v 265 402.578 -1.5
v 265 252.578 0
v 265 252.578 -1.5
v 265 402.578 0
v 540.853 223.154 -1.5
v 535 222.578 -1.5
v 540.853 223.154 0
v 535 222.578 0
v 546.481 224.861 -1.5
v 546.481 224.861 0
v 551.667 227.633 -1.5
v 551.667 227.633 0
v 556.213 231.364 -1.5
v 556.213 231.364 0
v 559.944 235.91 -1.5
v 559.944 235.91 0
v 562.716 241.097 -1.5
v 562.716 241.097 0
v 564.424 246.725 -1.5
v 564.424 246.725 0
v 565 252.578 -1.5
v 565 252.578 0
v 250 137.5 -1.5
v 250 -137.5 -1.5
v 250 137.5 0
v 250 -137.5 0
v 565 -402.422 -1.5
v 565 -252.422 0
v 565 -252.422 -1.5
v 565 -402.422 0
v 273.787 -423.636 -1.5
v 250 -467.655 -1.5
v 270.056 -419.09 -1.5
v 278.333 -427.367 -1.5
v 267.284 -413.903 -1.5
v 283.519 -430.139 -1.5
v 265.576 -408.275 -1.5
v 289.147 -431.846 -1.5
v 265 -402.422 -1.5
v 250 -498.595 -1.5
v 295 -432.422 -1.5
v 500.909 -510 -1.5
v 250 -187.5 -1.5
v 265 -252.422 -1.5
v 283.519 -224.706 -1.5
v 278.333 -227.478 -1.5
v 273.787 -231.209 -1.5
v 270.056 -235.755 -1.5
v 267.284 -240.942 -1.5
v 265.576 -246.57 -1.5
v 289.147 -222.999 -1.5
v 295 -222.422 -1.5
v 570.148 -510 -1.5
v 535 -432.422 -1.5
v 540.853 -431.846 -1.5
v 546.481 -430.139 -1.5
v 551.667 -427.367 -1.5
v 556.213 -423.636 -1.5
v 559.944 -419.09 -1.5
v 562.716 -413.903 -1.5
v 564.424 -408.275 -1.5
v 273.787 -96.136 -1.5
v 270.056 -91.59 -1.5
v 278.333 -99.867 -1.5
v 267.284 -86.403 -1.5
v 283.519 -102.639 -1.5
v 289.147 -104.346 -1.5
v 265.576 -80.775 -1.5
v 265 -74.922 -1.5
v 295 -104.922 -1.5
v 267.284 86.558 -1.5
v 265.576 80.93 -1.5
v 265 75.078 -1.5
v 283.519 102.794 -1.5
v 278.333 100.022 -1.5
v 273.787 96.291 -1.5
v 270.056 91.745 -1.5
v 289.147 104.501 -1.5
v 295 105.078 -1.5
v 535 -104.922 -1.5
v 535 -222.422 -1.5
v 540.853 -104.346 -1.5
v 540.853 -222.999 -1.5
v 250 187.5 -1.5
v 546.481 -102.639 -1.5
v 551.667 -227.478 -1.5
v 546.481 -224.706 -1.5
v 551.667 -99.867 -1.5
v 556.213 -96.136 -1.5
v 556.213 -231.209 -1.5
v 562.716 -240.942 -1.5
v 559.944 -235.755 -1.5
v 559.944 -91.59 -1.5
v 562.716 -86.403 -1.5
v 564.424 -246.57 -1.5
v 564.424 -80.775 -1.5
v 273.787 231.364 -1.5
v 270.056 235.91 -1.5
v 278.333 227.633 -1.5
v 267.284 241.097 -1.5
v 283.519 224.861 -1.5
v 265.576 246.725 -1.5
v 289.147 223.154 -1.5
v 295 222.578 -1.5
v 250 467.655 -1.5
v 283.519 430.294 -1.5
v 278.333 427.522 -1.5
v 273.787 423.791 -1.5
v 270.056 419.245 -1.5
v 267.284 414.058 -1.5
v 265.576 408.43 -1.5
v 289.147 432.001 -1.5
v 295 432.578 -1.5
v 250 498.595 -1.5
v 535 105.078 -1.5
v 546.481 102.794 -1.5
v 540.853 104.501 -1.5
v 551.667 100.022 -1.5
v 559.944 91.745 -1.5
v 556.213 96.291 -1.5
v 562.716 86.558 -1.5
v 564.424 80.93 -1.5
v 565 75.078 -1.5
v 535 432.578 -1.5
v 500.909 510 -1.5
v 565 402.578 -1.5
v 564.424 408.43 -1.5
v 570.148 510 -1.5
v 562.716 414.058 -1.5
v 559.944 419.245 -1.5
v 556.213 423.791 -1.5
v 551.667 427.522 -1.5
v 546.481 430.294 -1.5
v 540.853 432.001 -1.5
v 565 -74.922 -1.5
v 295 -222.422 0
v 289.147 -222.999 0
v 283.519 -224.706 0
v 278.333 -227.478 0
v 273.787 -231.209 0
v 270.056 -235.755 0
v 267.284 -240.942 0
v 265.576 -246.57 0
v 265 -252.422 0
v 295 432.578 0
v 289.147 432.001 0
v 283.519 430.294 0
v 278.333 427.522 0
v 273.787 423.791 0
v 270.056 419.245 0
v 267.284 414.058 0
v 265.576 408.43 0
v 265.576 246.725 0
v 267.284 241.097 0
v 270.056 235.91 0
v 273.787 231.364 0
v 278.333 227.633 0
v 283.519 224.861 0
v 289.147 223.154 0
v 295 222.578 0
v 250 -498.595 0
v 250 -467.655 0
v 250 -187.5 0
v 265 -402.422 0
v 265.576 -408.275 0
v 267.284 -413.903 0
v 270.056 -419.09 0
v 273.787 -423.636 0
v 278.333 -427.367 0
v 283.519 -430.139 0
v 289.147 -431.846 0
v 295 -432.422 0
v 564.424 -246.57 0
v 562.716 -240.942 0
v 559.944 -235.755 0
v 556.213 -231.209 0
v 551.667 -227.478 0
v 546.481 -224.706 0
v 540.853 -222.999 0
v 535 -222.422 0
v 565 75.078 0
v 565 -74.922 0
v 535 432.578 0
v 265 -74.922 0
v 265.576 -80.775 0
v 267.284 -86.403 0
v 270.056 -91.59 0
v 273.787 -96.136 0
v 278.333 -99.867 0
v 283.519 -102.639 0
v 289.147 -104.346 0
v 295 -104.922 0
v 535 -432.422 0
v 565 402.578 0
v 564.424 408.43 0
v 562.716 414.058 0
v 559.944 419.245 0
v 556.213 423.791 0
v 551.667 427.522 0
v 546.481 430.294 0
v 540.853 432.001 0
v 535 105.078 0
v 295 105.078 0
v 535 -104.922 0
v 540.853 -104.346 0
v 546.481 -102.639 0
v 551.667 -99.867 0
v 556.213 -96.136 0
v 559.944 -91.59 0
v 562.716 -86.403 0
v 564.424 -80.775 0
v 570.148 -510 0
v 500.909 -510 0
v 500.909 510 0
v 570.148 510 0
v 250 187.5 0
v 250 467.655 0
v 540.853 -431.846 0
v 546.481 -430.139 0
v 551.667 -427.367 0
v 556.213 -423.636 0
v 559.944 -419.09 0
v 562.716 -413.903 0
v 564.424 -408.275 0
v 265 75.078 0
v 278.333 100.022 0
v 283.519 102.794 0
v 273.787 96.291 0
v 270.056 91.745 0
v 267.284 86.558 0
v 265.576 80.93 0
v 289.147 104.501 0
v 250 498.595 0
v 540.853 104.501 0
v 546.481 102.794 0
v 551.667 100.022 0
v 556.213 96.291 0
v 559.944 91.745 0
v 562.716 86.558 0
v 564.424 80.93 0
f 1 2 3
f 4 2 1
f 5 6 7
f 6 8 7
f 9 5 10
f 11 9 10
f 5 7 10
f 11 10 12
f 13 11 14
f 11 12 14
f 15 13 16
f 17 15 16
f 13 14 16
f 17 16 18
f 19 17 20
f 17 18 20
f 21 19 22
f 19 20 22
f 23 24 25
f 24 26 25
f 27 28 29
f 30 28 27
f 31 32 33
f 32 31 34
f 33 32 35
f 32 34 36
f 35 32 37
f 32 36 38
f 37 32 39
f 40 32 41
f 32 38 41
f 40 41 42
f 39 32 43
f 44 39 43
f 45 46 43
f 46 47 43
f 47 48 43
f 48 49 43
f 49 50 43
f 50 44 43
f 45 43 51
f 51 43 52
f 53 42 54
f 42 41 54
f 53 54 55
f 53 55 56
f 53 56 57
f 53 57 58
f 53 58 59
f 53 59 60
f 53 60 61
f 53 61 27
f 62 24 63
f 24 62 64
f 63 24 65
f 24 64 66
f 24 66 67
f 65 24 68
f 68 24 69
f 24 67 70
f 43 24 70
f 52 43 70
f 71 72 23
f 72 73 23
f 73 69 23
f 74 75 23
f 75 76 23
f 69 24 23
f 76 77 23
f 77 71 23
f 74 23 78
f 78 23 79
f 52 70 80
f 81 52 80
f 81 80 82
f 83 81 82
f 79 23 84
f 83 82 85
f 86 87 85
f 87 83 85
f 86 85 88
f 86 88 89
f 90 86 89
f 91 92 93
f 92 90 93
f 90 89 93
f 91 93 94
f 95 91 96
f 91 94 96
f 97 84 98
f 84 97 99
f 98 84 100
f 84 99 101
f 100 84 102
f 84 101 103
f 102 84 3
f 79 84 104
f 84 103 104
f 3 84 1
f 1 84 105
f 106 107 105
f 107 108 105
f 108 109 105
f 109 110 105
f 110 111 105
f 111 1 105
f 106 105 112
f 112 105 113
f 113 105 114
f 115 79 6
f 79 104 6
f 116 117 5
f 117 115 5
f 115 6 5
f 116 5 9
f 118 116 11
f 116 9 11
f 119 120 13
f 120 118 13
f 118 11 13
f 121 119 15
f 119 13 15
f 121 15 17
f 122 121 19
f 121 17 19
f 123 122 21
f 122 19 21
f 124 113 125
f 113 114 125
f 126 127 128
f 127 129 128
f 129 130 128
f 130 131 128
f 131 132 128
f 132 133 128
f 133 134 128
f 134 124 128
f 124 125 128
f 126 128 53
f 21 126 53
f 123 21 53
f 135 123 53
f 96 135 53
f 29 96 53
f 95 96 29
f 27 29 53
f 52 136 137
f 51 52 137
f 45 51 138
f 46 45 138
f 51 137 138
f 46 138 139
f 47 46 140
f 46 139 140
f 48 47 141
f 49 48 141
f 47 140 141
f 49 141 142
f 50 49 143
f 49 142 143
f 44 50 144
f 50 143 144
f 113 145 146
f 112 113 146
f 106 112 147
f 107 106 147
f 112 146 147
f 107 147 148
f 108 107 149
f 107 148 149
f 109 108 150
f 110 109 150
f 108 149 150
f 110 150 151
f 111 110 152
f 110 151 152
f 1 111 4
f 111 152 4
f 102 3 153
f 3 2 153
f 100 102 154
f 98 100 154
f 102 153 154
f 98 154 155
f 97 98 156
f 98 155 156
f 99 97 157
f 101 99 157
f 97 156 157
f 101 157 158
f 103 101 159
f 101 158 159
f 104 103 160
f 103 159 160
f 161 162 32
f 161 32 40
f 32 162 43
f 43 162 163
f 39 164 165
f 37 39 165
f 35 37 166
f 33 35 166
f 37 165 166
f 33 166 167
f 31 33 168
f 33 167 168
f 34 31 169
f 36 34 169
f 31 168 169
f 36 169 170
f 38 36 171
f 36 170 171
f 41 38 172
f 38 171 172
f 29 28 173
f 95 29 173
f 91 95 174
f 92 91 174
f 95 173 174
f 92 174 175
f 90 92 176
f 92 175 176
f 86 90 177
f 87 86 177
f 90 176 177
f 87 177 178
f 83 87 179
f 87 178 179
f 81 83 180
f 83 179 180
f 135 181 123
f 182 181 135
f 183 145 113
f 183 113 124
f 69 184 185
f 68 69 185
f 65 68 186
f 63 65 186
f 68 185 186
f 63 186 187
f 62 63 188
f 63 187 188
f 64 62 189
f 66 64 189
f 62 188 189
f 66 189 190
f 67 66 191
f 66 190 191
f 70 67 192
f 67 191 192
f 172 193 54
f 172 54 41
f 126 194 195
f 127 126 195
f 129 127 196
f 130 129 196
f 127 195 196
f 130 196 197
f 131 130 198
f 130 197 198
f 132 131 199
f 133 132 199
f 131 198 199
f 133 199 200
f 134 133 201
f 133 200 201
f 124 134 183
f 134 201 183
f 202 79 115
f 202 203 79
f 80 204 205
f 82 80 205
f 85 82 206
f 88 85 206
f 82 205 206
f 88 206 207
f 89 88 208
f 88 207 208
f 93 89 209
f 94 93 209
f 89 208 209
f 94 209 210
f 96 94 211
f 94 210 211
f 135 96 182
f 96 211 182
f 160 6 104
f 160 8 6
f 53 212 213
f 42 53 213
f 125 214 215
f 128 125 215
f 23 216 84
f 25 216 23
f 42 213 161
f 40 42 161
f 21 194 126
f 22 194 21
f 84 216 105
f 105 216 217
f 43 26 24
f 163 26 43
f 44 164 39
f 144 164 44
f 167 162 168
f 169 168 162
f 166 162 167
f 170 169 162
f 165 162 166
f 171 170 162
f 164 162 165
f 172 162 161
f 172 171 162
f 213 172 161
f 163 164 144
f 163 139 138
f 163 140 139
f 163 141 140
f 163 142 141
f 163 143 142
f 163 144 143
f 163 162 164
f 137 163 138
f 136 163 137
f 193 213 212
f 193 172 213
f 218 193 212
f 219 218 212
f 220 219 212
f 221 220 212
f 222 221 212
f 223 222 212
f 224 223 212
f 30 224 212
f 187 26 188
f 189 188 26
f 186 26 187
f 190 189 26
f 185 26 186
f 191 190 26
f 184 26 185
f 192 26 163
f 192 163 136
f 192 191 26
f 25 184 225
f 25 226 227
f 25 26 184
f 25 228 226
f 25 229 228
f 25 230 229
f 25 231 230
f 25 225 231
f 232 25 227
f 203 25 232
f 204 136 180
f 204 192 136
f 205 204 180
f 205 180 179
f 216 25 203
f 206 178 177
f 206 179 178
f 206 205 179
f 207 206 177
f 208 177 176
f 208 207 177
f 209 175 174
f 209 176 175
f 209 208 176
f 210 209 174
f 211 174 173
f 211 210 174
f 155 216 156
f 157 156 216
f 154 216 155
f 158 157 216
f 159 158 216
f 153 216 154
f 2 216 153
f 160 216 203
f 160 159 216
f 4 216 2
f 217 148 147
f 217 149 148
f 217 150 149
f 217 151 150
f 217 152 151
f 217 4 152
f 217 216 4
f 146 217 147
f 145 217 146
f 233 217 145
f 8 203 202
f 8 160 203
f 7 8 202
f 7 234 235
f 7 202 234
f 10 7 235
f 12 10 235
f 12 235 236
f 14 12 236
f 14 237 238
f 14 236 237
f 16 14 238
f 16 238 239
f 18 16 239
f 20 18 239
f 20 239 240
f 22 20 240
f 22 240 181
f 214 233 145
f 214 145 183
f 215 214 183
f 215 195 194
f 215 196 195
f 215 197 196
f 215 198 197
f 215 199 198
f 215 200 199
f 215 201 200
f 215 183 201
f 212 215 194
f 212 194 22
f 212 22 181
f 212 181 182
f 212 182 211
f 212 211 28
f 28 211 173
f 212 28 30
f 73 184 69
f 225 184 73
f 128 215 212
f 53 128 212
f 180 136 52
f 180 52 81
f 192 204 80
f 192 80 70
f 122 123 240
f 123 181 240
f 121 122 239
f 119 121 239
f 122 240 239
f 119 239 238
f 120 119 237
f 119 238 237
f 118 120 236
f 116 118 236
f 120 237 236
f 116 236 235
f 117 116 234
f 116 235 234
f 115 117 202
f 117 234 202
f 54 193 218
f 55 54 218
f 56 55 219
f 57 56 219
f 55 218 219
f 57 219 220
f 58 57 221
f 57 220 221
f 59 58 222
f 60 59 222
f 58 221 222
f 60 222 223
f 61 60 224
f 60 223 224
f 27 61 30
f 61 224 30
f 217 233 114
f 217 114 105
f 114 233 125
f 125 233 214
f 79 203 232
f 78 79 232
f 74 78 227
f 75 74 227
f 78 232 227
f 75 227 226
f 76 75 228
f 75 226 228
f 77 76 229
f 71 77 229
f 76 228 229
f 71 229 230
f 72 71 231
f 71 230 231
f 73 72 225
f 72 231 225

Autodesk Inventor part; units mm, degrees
ref_plane "YZ Plane" through (0, 0, 0) normal (1, 0, 0) x (0, 1, 0)
ref_plane "XZ Plane" through (0, 0, 0) normal (0, 1, 0) x (-1, 0, 0)
ref_plane "Work Plane1" through (0, 0, 0) normal (0, 0, 1) x (1, 0, 0)
sketch "Sketch1" plane through (0, 0, 0) normal (0, 0, 1) x (1, 0, 0)
  arc A0 (535, 222.5775) -> (565, 252.5775) centre (535, 252.5775) ccw
  line L0 (535, 222.5775) -> (295, 222.5775)
  arc A1 (265, 252.5775) -> (295, 222.5775) centre (295, 252.5775) ccw
  line L1 (265, 252.5775) -> (265, 402.5775)
  arc A2 (295, 432.5775) -> (265, 402.5775) centre (295, 402.5775) ccw
  line L2 (295, 432.5775) -> (535, 432.5775)
  arc A3 (565, 402.5775) -> (535, 432.5775) centre (535, 402.5775) ccw
  line L3 (565, 402.5775) -> (565, 252.5775)
  arc A4 (535, -104.9225) -> (565, -74.9225) centre (535, -74.9225) ccw
  line L4 (535, -104.9225) -> (295, -104.9225)
  arc A5 (265, -74.9225) -> (295, -104.9225) centre (295, -74.9225) ccw
  line L5 (265, -74.9225) -> (265, 75.0775)
  arc A6 (295, 105.0775) -> (265, 75.0775) centre (295, 75.0775) ccw
  line L6 (295, 105.0775) -> (535, 105.0775)
  arc A7 (565, 75.0775) -> (535, 105.0775) centre (535, 75.0775) ccw
  line L7 (565, 75.0775) -> (565, -74.9225)
  line L8 (565, -252.4225) -> (565, -402.4225)
  arc A8 (535, -432.4225) -> (565, -402.4225) centre (535, -402.4225) ccw
  line L9 (535, -432.4225) -> (295, -432.4225)
  arc A9 (265, -402.4225) -> (295, -432.4225) centre (295, -402.4225) ccw
  line L10 (265, -402.4225) -> (265, -252.4225)
  arc A10 (295, -222.4225) -> (265, -252.4225) centre (295, -252.4225) ccw
  line L11 (295, -222.4225) -> (535, -222.4225)
  arc A11 (565, -252.4225) -> (535, -222.4225) centre (535, -252.4225) ccw
  line L12 (-550, 375.7749) -> (-550, 187.5)
  arc A12 (-473.6326, 455.6923) -> (-550, 375.7749) centre (-470, 375.7749) ccw
  line L13 (229.0918, 487.6344) -> (-473.6326, 455.6923)
  arc A13 (250, 467.655) -> (229.0918, 487.6344) centre (230, 467.655) ccw
  line L14 (250, 187.5) -> (250, 467.655)
  arc A14 (230, 167.5) -> (250, 187.5) centre (230, 187.5) ccw
  line L15 (-530, 167.5) -> (230, 167.5)
  arc A15 (-550, 187.5) -> (-530, 167.5) centre (-530, 187.5) ccw
  arc A16 (250, -187.5) -> (230, -167.5) centre (230, -187.5) ccw
  line L16 (250, -467.655) -> (250, -187.5)
  arc A17 (229.0918, -487.6344) -> (250, -467.655) centre (230, -467.655) ccw
  line L17 (-473.6326, -455.6923) -> (229.0918, -487.6344)
  arc A18 (-550, -375.7749) -> (-473.6326, -455.6923) centre (-470, -375.7749) ccw
  line L18 (-550, -187.5) -> (-550, -375.7749)
  arc A19 (-530, -167.5) -> (-550, -187.5) centre (-530, -187.5) ccw
  line L19 (230, -167.5) -> (-530, -167.5)
  line L20 (-550, 137.5) -> (-550, -137.5)
  arc A20 (-530, 157.5) -> (-550, 137.5) centre (-530, 137.5) ccw
  line L21 (230, 157.5) -> (-530, 157.5)
  arc A21 (250, 137.5) -> (230, 157.5) centre (230, 137.5) ccw
  line L22 (250, -137.5) -> (250, 137.5)
  arc A22 (230, -157.5) -> (250, -137.5) centre (230, -137.5) ccw
  line L23 (-530, -157.5) -> (230, -157.5)
  arc A23 (-550, -137.5) -> (-530, -157.5) centre (-530, -137.5) ccw
  line L24 (570.1484, 510) -> (570.1484, -510)
  line L25 (500.9086, 510) -> (570.1484, 510)
  line L26 (-474.4993, 465.6633) -> (500.9086, 510)
  arc A24 (-474.4993, 465.6633) -> (-559.5063, 385.1982) centre (-470, 375.7749) ccw
  line L27 (-570.7648, 375.1108) -> (-559.5063, 385.1982)
  line L28 (-600, 375.7749) -> (-570.7648, 375.1108)
  line L29 (-600, -375.7749) -> (-600, 375.7749)
  line L30 (-570.7648, -375.1108) -> (-600, -375.7749)
  line L31 (-559.5063, -385.1982) -> (-570.7648, -375.1108)
  arc A25 (-559.5063, -385.1982) -> (-474.4993, -465.6633) centre (-470, -375.7749) ccw
  line L32 (500.9086, -510) -> (-474.4993, -465.6633)
  line L33 (570.1484, -510) -> (500.9086, -510)
  line L34 (250, 498.5951) -> (250, -498.5951)
  point P0 (0, 0)
extrude "Plate1" add sketch "Sketch1" against normal blind 1.5 contours L34 L26 L25 L24 L33 L32 L16 L22 L14
equation "\"d0\" = Thickness"
equation "\"BendRadius\" = Thickness"
equation "\"BendReliefWidth\" = Thickness"
equation "\"BendReliefDepth\" = 0.5 * Thickness"
equation "\"CornerReliefSize\" = 4 * Thickness"
equation "\"MinimumRemnant\" = 2 * Thickness"
equation "\"TransitionRadius\" = BendRadius"
equation "\"JacobiRadiusSize\" = BendRadius"
equation "\"GapSize\" = Thickness"
equation "\"Thickness\" = 1.5"
properties part number "CARCASA_ALUM_5"
